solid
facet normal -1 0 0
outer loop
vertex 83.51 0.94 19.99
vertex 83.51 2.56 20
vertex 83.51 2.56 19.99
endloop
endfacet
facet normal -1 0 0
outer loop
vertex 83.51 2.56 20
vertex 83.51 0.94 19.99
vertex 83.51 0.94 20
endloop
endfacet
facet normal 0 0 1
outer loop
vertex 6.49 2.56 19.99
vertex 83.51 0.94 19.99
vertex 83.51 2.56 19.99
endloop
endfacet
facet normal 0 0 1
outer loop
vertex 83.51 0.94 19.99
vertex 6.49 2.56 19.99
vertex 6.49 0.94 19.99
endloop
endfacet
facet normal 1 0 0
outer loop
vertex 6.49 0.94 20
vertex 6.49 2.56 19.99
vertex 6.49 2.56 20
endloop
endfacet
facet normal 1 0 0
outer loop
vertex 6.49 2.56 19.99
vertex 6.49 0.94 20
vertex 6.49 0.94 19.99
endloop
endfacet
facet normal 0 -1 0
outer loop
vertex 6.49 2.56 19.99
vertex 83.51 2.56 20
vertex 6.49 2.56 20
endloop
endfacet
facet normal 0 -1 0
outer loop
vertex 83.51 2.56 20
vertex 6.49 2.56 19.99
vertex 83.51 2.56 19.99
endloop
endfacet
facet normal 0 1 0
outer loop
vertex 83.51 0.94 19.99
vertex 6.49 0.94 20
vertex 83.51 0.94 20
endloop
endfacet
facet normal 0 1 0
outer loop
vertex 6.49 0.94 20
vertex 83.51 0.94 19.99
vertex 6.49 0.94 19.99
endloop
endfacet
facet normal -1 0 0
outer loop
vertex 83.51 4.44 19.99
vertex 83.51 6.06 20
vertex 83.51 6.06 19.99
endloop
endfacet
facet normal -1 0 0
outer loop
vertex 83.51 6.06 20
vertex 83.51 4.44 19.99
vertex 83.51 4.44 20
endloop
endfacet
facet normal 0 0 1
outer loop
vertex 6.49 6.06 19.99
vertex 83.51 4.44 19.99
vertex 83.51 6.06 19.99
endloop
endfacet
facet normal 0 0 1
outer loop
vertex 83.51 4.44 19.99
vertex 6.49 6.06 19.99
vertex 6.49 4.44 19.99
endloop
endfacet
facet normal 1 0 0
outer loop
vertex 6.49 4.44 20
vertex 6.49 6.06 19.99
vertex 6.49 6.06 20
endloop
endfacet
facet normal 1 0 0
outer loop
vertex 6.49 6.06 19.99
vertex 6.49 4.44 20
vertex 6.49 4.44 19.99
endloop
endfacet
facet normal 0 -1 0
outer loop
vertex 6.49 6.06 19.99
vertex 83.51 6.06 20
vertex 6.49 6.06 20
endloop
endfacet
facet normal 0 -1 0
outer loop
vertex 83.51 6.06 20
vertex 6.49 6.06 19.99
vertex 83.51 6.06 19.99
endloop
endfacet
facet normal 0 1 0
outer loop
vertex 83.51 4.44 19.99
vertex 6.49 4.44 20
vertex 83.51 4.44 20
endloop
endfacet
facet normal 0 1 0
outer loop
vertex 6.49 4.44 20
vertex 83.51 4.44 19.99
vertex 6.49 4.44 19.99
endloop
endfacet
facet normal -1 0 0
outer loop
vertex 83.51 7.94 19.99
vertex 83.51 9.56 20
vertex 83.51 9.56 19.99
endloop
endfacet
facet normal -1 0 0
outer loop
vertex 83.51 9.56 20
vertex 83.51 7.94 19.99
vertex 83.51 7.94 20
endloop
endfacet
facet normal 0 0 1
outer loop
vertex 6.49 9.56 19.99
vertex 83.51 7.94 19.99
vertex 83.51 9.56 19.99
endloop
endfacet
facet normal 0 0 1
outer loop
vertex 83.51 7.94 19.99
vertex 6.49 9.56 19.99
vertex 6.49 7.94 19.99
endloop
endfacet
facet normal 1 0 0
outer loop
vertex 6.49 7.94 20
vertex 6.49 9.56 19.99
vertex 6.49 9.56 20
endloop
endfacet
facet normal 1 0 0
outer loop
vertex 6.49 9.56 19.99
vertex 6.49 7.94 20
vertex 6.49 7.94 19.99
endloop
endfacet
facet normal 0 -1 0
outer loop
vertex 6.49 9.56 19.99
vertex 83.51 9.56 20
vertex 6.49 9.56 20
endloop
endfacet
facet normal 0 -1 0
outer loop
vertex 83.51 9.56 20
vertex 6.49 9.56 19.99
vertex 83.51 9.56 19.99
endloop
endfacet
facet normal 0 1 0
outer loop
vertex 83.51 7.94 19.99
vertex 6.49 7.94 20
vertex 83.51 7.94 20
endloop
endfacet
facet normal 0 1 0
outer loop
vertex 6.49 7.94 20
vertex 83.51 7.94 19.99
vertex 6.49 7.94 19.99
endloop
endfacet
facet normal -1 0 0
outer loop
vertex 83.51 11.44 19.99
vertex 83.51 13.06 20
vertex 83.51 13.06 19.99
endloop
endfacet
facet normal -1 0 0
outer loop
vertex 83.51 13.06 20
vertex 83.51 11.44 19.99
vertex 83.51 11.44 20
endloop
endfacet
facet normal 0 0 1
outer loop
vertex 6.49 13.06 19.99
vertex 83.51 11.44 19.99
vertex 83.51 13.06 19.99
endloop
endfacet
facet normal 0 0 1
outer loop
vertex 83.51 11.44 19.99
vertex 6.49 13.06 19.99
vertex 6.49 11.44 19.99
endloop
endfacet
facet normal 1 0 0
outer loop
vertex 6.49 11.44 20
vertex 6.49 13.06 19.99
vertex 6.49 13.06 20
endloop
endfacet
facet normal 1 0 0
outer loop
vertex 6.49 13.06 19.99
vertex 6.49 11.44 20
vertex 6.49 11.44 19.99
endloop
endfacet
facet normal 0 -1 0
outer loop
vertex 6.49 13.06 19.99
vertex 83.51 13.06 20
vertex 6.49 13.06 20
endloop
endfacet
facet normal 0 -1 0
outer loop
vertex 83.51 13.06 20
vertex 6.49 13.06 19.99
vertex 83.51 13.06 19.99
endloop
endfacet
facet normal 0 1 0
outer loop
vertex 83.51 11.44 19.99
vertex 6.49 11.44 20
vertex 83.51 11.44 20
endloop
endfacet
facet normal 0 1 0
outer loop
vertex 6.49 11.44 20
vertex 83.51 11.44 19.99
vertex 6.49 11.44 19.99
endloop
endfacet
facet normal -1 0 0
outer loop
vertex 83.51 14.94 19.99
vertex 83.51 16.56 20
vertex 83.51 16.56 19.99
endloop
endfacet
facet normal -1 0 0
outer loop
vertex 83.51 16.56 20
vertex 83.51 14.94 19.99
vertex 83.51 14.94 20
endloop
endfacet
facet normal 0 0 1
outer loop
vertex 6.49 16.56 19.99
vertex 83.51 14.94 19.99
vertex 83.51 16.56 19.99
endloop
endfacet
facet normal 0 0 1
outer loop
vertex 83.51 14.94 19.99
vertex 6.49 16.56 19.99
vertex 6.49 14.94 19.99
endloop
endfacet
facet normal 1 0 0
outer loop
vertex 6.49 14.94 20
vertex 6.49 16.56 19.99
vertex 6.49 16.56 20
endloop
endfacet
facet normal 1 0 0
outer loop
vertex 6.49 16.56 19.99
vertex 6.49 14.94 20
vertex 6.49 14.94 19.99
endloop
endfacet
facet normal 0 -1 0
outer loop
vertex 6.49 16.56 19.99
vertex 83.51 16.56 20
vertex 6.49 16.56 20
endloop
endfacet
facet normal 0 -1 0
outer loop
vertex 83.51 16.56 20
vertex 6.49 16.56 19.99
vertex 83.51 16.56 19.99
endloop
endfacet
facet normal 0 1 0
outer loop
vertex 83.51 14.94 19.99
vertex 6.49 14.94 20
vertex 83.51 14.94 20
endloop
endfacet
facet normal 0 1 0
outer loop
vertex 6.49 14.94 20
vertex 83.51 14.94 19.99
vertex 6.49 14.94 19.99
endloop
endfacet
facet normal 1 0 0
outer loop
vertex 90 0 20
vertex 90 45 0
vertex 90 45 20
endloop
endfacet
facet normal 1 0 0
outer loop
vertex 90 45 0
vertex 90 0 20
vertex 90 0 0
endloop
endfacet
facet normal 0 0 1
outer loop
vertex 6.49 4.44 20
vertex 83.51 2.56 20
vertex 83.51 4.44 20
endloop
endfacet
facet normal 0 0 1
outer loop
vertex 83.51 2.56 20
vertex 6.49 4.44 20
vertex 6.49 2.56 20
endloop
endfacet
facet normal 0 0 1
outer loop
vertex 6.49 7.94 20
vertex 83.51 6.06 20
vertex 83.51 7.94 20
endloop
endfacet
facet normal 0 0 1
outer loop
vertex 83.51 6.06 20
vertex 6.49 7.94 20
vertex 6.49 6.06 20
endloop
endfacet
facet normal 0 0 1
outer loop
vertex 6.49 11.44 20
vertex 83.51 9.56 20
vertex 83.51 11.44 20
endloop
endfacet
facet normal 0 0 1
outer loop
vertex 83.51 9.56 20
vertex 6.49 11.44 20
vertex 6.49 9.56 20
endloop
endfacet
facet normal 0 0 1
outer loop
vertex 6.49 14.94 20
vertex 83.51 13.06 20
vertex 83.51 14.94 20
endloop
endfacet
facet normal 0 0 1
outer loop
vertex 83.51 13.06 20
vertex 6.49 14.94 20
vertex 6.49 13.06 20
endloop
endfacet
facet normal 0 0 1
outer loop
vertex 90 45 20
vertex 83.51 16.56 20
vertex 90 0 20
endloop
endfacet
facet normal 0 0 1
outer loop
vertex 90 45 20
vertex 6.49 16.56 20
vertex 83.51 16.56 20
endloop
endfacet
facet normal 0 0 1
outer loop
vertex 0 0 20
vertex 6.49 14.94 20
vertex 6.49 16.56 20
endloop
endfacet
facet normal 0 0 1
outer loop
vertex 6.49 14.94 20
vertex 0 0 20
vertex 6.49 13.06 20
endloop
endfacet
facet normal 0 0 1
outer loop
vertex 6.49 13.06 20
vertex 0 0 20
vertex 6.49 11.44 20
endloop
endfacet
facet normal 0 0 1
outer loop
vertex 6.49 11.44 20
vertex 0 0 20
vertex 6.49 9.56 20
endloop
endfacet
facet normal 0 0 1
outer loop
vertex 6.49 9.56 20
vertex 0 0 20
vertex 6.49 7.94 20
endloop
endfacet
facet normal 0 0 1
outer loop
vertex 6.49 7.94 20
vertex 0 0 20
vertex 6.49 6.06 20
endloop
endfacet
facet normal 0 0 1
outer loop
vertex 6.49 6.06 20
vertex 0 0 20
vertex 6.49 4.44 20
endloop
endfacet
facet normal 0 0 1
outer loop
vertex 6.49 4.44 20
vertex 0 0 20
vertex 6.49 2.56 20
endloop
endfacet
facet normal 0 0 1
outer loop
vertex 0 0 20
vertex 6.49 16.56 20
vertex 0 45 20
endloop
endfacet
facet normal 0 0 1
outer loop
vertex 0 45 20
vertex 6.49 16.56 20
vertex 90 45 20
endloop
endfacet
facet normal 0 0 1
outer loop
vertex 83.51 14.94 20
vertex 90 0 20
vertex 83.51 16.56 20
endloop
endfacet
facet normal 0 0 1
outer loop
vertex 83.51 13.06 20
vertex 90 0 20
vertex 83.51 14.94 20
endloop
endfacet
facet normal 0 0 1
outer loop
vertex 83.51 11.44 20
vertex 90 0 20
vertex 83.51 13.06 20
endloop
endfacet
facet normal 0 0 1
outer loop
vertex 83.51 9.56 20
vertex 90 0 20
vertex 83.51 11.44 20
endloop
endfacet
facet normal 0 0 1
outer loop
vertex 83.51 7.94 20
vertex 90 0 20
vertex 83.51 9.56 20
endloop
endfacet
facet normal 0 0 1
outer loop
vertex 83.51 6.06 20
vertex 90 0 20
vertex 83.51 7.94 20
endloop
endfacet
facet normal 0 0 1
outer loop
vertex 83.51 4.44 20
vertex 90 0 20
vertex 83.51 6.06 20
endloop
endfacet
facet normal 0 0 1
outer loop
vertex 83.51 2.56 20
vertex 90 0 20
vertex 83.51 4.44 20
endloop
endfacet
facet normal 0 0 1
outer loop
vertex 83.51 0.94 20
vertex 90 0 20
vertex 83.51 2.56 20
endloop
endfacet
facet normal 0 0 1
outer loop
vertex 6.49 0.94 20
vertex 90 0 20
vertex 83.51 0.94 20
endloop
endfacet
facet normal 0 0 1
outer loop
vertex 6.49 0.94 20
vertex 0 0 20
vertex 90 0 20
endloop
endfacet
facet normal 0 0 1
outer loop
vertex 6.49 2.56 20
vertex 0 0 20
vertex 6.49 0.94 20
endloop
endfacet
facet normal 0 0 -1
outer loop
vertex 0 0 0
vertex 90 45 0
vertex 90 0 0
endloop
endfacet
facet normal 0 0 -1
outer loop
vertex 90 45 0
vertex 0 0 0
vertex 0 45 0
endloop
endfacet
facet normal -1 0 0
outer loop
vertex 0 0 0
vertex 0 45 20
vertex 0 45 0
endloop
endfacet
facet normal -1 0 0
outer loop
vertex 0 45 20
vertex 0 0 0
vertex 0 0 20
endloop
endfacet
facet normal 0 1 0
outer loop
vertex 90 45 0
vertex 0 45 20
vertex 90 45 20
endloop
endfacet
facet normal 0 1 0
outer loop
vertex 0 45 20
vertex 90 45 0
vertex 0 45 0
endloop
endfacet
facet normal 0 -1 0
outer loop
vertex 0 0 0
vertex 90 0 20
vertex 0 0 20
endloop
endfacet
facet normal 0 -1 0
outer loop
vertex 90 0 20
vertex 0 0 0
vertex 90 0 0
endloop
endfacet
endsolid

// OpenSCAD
// Drying rack for 10 microscope slides
// Base block dimensions
BLOCK_X = 90;
BLOCK_Y = 45;
BLOCK_Z = 20;

// Slide dimensions
SLIDE_LENGTH = 75;
SLIDE_WIDTH = 25;
SLIDE_THICKNESS = 1;

// Slot dimensions
SLOT_LENGTH = 77;
SLOT_WIDTH = 1.6;
SLOT_DEPTH = 10;

// Slot spacing
SLOT_SPACING = 3.5;
NUM_SLOTS = 10;

// Calculate slot positions
// Slots are centred in X and Y
// Slot Y positions: centre of block in Y, spaced by SLOT_SPACING
// Total width of slot group = (NUM_SLOTS - 1) * SLOT_SPACING
slot_y_start = -((NUM_SLOTS - 1) * SLOT_SPACING) / 2;

// Slot X position: centred on block
slot_x_start = (BLOCK_X - SLOT_LENGTH) / 2;

// Slot Y position: centred on block (slot width is small, so slot_y is at block centre)
slot_y_centre = 0;

// Slot Z position: starts at top of block (BLOCK_Z) and goes down
slot_z_start = BLOCK_Z;

// Build the base block
difference() {
    // Base block
    cube([BLOCK_X, BLOCK_Y, BLOCK_Z], center = [false, false, false]);
    
    // Cut slots
    for (i = [0 : NUM_SLOTS - 1]) {
        slot_y_pos = slot_y_start + i * SLOT_SPACING;
        
        // Slot extends slightly past the block faces to ensure clean cuts
        translate([slot_x_start - 0.01, slot_y_pos - SLOT_WIDTH/2 - 0.01, slot_z_start - 0.01]) {
            cube([SLOT_LENGTH + 0.02, SLOT_WIDTH + 0.02, SLOT_DEPTH + 0.02]);
        }
    }
}
